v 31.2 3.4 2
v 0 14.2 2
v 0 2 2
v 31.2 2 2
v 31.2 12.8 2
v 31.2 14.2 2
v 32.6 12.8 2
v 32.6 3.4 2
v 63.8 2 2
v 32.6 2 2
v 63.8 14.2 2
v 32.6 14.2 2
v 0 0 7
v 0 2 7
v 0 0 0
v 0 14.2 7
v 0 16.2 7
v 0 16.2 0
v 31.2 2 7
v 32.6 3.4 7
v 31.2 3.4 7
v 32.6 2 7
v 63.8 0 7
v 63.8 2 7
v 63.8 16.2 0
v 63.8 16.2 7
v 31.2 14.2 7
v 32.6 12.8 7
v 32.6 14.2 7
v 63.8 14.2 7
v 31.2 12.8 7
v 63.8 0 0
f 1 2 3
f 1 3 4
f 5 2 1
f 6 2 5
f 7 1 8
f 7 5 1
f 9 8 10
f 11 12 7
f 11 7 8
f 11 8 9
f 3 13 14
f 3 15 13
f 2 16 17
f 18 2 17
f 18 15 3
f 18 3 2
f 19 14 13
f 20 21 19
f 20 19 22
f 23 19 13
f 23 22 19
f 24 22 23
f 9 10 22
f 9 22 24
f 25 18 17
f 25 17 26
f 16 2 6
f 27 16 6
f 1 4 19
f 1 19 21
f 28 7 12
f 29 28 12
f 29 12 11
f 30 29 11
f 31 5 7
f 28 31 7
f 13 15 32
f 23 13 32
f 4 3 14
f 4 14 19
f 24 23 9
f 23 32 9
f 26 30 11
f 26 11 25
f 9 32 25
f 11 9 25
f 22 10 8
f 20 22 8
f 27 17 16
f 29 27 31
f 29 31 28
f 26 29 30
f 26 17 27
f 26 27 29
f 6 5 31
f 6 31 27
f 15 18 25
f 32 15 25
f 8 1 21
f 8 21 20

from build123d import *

# Parameters (mm, degrees)
SKETCH_W     = 63.8
SKETCH_H     = 16.2
PAD_DEPTH    = 7
THICKNESS_T  = -2
SKETCH001_W  = 1.4
SKETCH001_H  = 1.4
PAD001_DEPTH = 5


with BuildPart() as part:
    # Sketch → Pad (new body)
    with BuildSketch(Plane.XY):
        with Locations((31.9, 8.1)):
            Rectangle(SKETCH_W, SKETCH_H)
    extrude(amount=PAD_DEPTH)

    # Thickness
    thickness_openings = [part.faces().sort_by_distance(p)[0] for p in [
        (31.9, 8.1, 7),
        (63.8, 8.1, 3.5),
        (0, 8.1, 3.5),
    ]]
    offset(amount=THICKNESS_T, openings=thickness_openings)

    # Sketch001 (on Face10 of Thickness) → Pad001 (join)
    with BuildSketch(Plane.XY.offset(2)):
        with Locations((31.9, 13.5)):
            Rectangle(SKETCH001_W, SKETCH001_H)
        with Locations((31.9, 2.7)):
            Rectangle(SKETCH001_W, SKETCH001_H)
    extrude(amount=PAD001_DEPTH)


solid = part.part
